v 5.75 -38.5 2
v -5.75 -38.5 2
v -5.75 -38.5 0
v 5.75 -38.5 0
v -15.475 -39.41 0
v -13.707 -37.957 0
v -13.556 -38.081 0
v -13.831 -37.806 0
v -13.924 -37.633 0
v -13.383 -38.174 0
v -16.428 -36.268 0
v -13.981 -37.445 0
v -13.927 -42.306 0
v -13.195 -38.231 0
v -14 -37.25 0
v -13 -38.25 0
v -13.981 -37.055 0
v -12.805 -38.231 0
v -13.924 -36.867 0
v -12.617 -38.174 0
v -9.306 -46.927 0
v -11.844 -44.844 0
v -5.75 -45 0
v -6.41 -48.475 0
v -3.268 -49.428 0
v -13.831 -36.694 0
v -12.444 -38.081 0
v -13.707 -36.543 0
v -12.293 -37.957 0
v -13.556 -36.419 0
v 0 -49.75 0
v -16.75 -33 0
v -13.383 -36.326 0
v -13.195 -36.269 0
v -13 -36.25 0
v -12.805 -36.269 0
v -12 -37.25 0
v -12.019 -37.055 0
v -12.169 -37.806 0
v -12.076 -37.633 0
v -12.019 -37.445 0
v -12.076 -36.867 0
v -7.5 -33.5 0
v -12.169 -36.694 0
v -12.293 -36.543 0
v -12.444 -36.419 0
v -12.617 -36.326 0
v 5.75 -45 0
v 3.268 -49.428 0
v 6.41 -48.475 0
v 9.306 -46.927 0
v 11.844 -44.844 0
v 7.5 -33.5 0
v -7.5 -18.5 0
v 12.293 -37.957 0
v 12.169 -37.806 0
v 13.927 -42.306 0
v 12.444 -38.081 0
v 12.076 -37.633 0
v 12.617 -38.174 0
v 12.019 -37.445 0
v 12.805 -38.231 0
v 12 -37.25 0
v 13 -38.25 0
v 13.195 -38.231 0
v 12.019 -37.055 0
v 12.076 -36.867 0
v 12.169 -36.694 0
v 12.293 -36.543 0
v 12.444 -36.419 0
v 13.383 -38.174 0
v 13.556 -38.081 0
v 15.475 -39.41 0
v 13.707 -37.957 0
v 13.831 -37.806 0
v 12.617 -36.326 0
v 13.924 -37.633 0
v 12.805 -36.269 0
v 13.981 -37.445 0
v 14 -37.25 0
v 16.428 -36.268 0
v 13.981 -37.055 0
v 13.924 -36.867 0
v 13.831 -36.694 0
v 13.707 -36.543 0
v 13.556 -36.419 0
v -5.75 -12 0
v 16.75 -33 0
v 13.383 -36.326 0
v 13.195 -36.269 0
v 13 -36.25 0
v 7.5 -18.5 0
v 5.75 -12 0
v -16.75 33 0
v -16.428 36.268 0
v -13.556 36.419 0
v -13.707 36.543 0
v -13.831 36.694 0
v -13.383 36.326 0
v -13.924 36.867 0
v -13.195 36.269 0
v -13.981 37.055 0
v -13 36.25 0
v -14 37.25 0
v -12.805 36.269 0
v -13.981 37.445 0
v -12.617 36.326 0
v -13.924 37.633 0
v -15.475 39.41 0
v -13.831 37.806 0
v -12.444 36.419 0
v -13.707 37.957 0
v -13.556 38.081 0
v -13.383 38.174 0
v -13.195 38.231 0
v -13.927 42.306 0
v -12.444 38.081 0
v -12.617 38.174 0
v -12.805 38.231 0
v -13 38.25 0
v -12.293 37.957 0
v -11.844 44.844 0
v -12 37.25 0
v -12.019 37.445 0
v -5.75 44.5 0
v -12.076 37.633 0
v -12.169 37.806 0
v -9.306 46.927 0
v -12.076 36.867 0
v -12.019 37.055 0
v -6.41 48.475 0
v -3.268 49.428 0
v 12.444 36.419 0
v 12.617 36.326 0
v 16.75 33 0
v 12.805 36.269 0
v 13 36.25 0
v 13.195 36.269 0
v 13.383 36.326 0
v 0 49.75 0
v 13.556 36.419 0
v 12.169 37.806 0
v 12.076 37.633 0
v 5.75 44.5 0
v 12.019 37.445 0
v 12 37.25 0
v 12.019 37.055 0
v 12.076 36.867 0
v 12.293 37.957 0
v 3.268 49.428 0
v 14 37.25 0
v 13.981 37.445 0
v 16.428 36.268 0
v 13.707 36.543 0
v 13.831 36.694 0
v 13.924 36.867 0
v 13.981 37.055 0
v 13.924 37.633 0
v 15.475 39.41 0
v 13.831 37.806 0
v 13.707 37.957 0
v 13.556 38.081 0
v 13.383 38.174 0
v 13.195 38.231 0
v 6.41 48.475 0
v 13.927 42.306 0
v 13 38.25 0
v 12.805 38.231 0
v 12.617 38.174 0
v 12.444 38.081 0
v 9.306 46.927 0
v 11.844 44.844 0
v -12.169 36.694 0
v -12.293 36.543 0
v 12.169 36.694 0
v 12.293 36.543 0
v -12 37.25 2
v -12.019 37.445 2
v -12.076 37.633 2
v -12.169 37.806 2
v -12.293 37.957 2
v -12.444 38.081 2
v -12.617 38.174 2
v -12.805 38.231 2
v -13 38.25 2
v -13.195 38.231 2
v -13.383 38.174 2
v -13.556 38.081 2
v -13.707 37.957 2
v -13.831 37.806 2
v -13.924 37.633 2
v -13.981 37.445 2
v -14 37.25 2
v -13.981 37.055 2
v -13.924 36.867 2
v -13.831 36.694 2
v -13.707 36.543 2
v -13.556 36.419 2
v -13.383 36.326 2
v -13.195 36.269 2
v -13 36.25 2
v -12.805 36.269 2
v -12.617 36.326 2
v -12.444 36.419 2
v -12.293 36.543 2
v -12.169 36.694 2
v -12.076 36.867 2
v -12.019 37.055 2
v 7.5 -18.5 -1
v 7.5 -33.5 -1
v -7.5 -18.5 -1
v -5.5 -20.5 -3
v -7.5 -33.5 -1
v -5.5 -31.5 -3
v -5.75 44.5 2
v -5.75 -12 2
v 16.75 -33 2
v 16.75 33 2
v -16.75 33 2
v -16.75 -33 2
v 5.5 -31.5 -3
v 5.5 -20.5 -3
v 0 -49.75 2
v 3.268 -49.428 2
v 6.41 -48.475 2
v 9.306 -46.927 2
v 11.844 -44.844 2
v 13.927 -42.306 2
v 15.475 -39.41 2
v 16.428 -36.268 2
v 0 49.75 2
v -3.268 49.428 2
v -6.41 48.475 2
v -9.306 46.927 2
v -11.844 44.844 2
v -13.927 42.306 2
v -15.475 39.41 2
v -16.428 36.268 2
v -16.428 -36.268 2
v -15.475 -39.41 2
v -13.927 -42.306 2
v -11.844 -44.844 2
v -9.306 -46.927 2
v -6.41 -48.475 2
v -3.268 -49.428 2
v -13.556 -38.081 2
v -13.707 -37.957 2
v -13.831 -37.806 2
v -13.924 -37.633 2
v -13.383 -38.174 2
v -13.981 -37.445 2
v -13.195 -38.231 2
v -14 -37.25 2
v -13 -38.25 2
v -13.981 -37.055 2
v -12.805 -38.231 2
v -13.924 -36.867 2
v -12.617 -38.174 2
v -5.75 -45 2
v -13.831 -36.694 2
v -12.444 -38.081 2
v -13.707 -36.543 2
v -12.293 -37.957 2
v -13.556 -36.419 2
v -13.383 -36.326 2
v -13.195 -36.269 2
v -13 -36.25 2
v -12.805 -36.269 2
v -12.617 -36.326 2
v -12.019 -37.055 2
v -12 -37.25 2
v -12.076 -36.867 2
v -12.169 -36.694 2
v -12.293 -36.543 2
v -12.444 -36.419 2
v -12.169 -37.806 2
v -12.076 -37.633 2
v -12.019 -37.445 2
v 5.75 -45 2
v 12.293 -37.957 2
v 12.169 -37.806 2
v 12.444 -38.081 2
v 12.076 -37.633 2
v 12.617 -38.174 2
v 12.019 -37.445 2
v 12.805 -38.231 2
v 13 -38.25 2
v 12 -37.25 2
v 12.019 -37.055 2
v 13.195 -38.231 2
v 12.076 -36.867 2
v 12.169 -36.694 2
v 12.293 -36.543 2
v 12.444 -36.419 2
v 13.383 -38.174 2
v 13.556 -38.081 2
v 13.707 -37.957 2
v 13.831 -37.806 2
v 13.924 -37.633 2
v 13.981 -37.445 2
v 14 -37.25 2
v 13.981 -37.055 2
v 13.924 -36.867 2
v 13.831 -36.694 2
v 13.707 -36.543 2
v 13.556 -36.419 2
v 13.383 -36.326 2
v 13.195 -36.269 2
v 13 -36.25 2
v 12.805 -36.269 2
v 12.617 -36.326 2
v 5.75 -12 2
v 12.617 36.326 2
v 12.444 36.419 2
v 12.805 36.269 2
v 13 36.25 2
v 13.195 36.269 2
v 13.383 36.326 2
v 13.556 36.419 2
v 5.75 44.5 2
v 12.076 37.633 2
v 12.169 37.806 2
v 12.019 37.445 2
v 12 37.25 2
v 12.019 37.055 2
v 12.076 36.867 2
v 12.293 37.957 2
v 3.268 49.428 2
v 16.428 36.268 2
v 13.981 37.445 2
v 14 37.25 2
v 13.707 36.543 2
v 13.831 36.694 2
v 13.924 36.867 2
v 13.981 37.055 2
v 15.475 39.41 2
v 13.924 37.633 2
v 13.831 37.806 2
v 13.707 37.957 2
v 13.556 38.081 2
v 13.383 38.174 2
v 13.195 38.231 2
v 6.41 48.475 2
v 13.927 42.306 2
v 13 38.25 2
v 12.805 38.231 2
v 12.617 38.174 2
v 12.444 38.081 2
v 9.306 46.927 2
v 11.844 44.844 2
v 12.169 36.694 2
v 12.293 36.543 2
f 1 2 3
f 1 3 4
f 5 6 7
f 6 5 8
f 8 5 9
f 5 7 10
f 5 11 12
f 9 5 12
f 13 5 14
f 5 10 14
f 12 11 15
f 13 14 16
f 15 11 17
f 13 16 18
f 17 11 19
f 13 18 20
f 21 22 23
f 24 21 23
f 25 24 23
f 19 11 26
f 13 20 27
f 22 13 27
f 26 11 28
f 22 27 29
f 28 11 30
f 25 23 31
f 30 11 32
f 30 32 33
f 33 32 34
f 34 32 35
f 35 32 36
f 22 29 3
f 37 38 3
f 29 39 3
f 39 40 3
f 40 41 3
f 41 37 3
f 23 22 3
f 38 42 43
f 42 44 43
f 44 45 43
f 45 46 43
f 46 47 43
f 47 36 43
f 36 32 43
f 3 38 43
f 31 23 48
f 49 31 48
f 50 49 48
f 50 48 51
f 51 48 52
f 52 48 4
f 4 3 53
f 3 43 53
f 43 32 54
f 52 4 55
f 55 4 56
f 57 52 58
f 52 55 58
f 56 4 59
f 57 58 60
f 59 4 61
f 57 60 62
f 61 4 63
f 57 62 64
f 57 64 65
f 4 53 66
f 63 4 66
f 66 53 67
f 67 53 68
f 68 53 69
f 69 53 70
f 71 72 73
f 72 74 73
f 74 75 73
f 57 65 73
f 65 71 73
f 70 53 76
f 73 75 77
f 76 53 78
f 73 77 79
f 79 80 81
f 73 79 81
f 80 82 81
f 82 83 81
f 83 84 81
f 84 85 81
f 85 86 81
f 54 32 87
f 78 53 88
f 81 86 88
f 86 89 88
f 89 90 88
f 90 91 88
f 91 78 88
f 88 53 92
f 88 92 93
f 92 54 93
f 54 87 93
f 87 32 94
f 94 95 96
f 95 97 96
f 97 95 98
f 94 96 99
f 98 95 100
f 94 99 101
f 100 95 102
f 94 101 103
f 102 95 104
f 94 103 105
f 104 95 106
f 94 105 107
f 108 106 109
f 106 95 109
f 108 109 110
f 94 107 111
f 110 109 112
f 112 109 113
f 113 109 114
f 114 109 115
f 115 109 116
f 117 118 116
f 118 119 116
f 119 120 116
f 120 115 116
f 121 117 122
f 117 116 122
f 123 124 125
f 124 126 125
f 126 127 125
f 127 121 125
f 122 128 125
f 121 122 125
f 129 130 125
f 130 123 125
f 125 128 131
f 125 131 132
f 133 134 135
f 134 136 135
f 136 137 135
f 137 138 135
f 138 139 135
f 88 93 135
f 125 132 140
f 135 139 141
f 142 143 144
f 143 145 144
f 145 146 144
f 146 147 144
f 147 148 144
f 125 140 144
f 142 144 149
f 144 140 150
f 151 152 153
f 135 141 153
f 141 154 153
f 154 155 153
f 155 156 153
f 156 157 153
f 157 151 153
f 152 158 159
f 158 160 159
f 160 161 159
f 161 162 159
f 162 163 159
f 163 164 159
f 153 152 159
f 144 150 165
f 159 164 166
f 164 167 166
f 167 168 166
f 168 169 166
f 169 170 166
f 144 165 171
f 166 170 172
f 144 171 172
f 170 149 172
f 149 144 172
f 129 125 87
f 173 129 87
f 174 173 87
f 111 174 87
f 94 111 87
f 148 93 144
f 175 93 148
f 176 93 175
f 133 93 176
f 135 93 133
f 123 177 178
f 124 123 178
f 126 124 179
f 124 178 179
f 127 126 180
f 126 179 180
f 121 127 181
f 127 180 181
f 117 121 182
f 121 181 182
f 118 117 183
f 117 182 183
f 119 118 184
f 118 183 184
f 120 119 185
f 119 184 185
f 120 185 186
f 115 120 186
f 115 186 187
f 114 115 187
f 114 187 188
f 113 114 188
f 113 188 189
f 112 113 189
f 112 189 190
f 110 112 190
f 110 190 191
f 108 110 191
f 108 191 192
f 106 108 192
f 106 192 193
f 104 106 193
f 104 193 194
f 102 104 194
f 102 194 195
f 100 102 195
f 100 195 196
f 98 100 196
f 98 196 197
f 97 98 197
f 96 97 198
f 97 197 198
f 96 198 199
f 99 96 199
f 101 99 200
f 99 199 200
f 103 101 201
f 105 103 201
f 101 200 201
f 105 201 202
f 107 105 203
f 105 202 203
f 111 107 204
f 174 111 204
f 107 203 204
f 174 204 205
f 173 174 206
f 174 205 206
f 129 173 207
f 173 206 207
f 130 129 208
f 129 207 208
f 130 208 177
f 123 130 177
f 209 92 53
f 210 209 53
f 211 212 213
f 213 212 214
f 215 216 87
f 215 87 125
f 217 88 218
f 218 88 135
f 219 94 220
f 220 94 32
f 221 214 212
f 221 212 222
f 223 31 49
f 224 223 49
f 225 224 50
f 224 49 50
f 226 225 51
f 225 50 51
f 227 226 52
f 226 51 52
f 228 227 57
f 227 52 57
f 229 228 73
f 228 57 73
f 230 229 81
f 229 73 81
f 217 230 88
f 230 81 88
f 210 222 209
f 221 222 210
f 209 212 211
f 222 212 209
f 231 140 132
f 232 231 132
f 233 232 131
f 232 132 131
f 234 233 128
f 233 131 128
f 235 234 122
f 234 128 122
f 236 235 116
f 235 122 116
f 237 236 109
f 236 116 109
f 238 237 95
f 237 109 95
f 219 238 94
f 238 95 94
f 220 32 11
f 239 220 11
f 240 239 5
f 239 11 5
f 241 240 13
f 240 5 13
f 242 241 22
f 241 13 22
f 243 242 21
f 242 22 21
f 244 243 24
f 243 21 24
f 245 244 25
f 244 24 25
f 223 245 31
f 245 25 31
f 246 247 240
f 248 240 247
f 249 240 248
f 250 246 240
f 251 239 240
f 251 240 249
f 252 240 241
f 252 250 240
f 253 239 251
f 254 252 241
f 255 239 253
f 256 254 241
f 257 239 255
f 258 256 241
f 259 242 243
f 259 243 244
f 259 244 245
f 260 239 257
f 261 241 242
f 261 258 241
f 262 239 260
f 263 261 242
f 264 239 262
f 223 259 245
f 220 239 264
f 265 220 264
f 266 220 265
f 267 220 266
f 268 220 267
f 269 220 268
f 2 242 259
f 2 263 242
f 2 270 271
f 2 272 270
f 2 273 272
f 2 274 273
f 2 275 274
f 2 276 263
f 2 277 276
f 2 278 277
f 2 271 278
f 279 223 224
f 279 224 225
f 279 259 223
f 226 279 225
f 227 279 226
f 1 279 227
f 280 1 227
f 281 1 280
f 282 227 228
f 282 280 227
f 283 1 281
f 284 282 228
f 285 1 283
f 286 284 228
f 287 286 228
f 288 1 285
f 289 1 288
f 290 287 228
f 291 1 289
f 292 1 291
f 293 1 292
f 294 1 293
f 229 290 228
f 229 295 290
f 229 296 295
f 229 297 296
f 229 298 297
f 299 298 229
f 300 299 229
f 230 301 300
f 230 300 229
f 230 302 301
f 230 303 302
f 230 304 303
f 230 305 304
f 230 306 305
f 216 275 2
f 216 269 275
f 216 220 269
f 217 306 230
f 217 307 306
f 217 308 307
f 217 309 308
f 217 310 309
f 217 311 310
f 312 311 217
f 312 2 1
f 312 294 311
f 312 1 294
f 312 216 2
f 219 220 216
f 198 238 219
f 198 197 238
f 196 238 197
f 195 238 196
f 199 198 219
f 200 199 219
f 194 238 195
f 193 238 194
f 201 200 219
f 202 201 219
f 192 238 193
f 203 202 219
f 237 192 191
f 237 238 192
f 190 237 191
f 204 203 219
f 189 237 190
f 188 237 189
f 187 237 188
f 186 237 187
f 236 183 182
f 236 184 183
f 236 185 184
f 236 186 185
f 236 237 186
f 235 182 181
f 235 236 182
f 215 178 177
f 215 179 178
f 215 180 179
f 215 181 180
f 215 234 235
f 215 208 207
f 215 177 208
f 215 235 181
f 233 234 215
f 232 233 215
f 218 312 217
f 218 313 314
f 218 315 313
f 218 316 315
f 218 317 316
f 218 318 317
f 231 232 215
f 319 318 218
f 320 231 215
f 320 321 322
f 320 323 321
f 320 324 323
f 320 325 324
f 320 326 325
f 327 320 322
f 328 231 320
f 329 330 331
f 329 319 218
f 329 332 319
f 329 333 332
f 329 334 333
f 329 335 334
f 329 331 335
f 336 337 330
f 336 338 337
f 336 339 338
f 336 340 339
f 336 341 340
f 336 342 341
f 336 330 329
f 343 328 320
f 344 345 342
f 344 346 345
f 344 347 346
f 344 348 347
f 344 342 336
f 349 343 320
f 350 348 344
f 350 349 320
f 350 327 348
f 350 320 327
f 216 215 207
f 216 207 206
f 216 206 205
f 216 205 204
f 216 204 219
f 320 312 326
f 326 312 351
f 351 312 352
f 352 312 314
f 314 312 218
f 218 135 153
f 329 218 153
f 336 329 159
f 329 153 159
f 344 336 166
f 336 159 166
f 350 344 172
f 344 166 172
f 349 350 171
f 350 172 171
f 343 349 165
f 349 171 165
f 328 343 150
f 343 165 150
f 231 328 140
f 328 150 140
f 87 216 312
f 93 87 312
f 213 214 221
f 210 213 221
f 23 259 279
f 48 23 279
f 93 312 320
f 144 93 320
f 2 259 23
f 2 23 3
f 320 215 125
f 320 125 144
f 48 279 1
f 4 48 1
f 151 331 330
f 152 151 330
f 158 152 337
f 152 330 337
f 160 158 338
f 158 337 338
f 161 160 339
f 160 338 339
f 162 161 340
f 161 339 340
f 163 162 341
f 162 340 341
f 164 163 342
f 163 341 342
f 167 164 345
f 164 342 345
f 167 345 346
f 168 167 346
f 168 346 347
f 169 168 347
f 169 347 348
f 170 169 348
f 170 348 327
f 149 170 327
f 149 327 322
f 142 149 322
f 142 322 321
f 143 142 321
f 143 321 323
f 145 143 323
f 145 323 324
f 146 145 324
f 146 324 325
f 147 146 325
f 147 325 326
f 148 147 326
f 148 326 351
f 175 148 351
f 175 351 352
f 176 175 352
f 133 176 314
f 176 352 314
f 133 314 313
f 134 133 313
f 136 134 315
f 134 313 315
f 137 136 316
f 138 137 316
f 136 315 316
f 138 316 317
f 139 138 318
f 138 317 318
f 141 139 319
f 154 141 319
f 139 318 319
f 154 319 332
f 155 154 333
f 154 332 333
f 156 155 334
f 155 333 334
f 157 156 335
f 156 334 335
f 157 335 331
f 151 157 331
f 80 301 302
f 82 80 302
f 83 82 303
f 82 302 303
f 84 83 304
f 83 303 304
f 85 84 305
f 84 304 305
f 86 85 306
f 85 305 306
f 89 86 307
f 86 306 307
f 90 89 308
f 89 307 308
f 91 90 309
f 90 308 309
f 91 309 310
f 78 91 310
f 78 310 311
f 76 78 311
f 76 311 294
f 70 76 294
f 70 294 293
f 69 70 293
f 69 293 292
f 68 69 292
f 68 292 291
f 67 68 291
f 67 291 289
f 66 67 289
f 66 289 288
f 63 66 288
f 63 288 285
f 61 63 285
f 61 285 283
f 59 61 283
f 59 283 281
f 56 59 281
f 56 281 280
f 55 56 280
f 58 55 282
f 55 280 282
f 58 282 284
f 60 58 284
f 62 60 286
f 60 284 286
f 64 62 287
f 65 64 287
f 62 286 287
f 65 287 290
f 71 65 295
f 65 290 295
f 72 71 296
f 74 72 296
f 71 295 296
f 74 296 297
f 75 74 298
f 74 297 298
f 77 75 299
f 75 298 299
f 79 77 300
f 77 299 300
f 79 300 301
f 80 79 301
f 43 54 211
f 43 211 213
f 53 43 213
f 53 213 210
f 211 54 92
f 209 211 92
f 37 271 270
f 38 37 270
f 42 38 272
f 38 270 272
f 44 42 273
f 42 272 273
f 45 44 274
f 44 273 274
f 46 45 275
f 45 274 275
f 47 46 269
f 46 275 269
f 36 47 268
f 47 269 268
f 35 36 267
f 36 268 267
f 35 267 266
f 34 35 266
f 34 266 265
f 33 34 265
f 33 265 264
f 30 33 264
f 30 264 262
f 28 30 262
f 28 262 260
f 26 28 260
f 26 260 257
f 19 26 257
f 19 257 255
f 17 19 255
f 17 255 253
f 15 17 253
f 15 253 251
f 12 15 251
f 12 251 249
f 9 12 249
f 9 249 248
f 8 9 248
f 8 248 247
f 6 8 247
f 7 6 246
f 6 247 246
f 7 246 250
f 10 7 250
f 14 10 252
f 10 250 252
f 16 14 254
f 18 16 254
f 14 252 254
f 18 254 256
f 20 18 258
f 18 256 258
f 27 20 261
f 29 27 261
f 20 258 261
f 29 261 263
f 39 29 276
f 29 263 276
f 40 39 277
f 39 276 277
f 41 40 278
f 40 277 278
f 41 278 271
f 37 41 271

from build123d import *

# Parameters (mm, degrees)
F1_DEPTH = 2
F2_R     = 1
F3_DEPTH = 2.001
F4_W     = 11.5
F4_H     = 56.5
F4_H_2   = 6.5
F5_DEPTH = 2.001
F6_W     = 15
F6_H     = 15
F7_DEPTH = 3
F8_SIZE  = 2


with BuildPart() as f1:
    # F0 (on Top) → F1 (new body)
    with BuildSketch(Plane.XY):
        with BuildLine():
            Line((16.75, -33), (16.75, 33))
            ThreePointArc((16.75, 33), (11.844039, 44.844039), (0, 49.75))
            ThreePointArc((0, 49.75), (-11.844039, 44.844039), (-16.75, 33))
            Line((-16.75, 33), (-16.75, -33))
            ThreePointArc((-16.75, -33), (-11.844039, -44.844039), (0, -49.75))
            ThreePointArc((0, -49.75), (11.844039, -44.844039), (16.75, -33))
        make_face()
    extrude(amount=F1_DEPTH)

    # F2 (on face) → F3 (cut, through all)
    with BuildSketch(Plane.XY.offset(2)):
        with Locations((-13, -37.25)):
            Circle(F2_R)
        with Locations((13, -37.25)):
            Circle(F2_R)
        with Locations((13, 37.25)):
            Circle(F2_R)
        with Locations((-13, 37.25)):
            Circle(F2_R)
    extrude(amount=-F3_DEPTH, mode=Mode.SUBTRACT)

    # F4 (on face) → F5 (cut, through all)
    with BuildSketch(Plane.XY.offset(2)):
        with Locations((0, 16.25)):
            Rectangle(F4_W, F4_H)
        with Locations((0, -41.75)):
            Rectangle(F4_W, F4_H_2)
    extrude(amount=-F5_DEPTH, mode=Mode.SUBTRACT)

    # F6 (on face) → F7 (join)
    with BuildSketch(Plane(origin=(0, 0, 0), x_dir=(1, 0, 0), z_dir=(0, 0, -1))):
        with Locations((0, 26)):
            Rectangle(F6_W, F6_H)
    extrude(amount=F7_DEPTH)

    # F8
    f8_edges = [f1.edges().sort_by_distance(p)[0] for p in [
        (0, -33.5, -3),
        (-7.5, -26, -3),
        (0, -18.5, -3),
        (7.5, -26, -3),
    ]]
    chamfer(f8_edges, length=F8_SIZE)


solid = f1.part
